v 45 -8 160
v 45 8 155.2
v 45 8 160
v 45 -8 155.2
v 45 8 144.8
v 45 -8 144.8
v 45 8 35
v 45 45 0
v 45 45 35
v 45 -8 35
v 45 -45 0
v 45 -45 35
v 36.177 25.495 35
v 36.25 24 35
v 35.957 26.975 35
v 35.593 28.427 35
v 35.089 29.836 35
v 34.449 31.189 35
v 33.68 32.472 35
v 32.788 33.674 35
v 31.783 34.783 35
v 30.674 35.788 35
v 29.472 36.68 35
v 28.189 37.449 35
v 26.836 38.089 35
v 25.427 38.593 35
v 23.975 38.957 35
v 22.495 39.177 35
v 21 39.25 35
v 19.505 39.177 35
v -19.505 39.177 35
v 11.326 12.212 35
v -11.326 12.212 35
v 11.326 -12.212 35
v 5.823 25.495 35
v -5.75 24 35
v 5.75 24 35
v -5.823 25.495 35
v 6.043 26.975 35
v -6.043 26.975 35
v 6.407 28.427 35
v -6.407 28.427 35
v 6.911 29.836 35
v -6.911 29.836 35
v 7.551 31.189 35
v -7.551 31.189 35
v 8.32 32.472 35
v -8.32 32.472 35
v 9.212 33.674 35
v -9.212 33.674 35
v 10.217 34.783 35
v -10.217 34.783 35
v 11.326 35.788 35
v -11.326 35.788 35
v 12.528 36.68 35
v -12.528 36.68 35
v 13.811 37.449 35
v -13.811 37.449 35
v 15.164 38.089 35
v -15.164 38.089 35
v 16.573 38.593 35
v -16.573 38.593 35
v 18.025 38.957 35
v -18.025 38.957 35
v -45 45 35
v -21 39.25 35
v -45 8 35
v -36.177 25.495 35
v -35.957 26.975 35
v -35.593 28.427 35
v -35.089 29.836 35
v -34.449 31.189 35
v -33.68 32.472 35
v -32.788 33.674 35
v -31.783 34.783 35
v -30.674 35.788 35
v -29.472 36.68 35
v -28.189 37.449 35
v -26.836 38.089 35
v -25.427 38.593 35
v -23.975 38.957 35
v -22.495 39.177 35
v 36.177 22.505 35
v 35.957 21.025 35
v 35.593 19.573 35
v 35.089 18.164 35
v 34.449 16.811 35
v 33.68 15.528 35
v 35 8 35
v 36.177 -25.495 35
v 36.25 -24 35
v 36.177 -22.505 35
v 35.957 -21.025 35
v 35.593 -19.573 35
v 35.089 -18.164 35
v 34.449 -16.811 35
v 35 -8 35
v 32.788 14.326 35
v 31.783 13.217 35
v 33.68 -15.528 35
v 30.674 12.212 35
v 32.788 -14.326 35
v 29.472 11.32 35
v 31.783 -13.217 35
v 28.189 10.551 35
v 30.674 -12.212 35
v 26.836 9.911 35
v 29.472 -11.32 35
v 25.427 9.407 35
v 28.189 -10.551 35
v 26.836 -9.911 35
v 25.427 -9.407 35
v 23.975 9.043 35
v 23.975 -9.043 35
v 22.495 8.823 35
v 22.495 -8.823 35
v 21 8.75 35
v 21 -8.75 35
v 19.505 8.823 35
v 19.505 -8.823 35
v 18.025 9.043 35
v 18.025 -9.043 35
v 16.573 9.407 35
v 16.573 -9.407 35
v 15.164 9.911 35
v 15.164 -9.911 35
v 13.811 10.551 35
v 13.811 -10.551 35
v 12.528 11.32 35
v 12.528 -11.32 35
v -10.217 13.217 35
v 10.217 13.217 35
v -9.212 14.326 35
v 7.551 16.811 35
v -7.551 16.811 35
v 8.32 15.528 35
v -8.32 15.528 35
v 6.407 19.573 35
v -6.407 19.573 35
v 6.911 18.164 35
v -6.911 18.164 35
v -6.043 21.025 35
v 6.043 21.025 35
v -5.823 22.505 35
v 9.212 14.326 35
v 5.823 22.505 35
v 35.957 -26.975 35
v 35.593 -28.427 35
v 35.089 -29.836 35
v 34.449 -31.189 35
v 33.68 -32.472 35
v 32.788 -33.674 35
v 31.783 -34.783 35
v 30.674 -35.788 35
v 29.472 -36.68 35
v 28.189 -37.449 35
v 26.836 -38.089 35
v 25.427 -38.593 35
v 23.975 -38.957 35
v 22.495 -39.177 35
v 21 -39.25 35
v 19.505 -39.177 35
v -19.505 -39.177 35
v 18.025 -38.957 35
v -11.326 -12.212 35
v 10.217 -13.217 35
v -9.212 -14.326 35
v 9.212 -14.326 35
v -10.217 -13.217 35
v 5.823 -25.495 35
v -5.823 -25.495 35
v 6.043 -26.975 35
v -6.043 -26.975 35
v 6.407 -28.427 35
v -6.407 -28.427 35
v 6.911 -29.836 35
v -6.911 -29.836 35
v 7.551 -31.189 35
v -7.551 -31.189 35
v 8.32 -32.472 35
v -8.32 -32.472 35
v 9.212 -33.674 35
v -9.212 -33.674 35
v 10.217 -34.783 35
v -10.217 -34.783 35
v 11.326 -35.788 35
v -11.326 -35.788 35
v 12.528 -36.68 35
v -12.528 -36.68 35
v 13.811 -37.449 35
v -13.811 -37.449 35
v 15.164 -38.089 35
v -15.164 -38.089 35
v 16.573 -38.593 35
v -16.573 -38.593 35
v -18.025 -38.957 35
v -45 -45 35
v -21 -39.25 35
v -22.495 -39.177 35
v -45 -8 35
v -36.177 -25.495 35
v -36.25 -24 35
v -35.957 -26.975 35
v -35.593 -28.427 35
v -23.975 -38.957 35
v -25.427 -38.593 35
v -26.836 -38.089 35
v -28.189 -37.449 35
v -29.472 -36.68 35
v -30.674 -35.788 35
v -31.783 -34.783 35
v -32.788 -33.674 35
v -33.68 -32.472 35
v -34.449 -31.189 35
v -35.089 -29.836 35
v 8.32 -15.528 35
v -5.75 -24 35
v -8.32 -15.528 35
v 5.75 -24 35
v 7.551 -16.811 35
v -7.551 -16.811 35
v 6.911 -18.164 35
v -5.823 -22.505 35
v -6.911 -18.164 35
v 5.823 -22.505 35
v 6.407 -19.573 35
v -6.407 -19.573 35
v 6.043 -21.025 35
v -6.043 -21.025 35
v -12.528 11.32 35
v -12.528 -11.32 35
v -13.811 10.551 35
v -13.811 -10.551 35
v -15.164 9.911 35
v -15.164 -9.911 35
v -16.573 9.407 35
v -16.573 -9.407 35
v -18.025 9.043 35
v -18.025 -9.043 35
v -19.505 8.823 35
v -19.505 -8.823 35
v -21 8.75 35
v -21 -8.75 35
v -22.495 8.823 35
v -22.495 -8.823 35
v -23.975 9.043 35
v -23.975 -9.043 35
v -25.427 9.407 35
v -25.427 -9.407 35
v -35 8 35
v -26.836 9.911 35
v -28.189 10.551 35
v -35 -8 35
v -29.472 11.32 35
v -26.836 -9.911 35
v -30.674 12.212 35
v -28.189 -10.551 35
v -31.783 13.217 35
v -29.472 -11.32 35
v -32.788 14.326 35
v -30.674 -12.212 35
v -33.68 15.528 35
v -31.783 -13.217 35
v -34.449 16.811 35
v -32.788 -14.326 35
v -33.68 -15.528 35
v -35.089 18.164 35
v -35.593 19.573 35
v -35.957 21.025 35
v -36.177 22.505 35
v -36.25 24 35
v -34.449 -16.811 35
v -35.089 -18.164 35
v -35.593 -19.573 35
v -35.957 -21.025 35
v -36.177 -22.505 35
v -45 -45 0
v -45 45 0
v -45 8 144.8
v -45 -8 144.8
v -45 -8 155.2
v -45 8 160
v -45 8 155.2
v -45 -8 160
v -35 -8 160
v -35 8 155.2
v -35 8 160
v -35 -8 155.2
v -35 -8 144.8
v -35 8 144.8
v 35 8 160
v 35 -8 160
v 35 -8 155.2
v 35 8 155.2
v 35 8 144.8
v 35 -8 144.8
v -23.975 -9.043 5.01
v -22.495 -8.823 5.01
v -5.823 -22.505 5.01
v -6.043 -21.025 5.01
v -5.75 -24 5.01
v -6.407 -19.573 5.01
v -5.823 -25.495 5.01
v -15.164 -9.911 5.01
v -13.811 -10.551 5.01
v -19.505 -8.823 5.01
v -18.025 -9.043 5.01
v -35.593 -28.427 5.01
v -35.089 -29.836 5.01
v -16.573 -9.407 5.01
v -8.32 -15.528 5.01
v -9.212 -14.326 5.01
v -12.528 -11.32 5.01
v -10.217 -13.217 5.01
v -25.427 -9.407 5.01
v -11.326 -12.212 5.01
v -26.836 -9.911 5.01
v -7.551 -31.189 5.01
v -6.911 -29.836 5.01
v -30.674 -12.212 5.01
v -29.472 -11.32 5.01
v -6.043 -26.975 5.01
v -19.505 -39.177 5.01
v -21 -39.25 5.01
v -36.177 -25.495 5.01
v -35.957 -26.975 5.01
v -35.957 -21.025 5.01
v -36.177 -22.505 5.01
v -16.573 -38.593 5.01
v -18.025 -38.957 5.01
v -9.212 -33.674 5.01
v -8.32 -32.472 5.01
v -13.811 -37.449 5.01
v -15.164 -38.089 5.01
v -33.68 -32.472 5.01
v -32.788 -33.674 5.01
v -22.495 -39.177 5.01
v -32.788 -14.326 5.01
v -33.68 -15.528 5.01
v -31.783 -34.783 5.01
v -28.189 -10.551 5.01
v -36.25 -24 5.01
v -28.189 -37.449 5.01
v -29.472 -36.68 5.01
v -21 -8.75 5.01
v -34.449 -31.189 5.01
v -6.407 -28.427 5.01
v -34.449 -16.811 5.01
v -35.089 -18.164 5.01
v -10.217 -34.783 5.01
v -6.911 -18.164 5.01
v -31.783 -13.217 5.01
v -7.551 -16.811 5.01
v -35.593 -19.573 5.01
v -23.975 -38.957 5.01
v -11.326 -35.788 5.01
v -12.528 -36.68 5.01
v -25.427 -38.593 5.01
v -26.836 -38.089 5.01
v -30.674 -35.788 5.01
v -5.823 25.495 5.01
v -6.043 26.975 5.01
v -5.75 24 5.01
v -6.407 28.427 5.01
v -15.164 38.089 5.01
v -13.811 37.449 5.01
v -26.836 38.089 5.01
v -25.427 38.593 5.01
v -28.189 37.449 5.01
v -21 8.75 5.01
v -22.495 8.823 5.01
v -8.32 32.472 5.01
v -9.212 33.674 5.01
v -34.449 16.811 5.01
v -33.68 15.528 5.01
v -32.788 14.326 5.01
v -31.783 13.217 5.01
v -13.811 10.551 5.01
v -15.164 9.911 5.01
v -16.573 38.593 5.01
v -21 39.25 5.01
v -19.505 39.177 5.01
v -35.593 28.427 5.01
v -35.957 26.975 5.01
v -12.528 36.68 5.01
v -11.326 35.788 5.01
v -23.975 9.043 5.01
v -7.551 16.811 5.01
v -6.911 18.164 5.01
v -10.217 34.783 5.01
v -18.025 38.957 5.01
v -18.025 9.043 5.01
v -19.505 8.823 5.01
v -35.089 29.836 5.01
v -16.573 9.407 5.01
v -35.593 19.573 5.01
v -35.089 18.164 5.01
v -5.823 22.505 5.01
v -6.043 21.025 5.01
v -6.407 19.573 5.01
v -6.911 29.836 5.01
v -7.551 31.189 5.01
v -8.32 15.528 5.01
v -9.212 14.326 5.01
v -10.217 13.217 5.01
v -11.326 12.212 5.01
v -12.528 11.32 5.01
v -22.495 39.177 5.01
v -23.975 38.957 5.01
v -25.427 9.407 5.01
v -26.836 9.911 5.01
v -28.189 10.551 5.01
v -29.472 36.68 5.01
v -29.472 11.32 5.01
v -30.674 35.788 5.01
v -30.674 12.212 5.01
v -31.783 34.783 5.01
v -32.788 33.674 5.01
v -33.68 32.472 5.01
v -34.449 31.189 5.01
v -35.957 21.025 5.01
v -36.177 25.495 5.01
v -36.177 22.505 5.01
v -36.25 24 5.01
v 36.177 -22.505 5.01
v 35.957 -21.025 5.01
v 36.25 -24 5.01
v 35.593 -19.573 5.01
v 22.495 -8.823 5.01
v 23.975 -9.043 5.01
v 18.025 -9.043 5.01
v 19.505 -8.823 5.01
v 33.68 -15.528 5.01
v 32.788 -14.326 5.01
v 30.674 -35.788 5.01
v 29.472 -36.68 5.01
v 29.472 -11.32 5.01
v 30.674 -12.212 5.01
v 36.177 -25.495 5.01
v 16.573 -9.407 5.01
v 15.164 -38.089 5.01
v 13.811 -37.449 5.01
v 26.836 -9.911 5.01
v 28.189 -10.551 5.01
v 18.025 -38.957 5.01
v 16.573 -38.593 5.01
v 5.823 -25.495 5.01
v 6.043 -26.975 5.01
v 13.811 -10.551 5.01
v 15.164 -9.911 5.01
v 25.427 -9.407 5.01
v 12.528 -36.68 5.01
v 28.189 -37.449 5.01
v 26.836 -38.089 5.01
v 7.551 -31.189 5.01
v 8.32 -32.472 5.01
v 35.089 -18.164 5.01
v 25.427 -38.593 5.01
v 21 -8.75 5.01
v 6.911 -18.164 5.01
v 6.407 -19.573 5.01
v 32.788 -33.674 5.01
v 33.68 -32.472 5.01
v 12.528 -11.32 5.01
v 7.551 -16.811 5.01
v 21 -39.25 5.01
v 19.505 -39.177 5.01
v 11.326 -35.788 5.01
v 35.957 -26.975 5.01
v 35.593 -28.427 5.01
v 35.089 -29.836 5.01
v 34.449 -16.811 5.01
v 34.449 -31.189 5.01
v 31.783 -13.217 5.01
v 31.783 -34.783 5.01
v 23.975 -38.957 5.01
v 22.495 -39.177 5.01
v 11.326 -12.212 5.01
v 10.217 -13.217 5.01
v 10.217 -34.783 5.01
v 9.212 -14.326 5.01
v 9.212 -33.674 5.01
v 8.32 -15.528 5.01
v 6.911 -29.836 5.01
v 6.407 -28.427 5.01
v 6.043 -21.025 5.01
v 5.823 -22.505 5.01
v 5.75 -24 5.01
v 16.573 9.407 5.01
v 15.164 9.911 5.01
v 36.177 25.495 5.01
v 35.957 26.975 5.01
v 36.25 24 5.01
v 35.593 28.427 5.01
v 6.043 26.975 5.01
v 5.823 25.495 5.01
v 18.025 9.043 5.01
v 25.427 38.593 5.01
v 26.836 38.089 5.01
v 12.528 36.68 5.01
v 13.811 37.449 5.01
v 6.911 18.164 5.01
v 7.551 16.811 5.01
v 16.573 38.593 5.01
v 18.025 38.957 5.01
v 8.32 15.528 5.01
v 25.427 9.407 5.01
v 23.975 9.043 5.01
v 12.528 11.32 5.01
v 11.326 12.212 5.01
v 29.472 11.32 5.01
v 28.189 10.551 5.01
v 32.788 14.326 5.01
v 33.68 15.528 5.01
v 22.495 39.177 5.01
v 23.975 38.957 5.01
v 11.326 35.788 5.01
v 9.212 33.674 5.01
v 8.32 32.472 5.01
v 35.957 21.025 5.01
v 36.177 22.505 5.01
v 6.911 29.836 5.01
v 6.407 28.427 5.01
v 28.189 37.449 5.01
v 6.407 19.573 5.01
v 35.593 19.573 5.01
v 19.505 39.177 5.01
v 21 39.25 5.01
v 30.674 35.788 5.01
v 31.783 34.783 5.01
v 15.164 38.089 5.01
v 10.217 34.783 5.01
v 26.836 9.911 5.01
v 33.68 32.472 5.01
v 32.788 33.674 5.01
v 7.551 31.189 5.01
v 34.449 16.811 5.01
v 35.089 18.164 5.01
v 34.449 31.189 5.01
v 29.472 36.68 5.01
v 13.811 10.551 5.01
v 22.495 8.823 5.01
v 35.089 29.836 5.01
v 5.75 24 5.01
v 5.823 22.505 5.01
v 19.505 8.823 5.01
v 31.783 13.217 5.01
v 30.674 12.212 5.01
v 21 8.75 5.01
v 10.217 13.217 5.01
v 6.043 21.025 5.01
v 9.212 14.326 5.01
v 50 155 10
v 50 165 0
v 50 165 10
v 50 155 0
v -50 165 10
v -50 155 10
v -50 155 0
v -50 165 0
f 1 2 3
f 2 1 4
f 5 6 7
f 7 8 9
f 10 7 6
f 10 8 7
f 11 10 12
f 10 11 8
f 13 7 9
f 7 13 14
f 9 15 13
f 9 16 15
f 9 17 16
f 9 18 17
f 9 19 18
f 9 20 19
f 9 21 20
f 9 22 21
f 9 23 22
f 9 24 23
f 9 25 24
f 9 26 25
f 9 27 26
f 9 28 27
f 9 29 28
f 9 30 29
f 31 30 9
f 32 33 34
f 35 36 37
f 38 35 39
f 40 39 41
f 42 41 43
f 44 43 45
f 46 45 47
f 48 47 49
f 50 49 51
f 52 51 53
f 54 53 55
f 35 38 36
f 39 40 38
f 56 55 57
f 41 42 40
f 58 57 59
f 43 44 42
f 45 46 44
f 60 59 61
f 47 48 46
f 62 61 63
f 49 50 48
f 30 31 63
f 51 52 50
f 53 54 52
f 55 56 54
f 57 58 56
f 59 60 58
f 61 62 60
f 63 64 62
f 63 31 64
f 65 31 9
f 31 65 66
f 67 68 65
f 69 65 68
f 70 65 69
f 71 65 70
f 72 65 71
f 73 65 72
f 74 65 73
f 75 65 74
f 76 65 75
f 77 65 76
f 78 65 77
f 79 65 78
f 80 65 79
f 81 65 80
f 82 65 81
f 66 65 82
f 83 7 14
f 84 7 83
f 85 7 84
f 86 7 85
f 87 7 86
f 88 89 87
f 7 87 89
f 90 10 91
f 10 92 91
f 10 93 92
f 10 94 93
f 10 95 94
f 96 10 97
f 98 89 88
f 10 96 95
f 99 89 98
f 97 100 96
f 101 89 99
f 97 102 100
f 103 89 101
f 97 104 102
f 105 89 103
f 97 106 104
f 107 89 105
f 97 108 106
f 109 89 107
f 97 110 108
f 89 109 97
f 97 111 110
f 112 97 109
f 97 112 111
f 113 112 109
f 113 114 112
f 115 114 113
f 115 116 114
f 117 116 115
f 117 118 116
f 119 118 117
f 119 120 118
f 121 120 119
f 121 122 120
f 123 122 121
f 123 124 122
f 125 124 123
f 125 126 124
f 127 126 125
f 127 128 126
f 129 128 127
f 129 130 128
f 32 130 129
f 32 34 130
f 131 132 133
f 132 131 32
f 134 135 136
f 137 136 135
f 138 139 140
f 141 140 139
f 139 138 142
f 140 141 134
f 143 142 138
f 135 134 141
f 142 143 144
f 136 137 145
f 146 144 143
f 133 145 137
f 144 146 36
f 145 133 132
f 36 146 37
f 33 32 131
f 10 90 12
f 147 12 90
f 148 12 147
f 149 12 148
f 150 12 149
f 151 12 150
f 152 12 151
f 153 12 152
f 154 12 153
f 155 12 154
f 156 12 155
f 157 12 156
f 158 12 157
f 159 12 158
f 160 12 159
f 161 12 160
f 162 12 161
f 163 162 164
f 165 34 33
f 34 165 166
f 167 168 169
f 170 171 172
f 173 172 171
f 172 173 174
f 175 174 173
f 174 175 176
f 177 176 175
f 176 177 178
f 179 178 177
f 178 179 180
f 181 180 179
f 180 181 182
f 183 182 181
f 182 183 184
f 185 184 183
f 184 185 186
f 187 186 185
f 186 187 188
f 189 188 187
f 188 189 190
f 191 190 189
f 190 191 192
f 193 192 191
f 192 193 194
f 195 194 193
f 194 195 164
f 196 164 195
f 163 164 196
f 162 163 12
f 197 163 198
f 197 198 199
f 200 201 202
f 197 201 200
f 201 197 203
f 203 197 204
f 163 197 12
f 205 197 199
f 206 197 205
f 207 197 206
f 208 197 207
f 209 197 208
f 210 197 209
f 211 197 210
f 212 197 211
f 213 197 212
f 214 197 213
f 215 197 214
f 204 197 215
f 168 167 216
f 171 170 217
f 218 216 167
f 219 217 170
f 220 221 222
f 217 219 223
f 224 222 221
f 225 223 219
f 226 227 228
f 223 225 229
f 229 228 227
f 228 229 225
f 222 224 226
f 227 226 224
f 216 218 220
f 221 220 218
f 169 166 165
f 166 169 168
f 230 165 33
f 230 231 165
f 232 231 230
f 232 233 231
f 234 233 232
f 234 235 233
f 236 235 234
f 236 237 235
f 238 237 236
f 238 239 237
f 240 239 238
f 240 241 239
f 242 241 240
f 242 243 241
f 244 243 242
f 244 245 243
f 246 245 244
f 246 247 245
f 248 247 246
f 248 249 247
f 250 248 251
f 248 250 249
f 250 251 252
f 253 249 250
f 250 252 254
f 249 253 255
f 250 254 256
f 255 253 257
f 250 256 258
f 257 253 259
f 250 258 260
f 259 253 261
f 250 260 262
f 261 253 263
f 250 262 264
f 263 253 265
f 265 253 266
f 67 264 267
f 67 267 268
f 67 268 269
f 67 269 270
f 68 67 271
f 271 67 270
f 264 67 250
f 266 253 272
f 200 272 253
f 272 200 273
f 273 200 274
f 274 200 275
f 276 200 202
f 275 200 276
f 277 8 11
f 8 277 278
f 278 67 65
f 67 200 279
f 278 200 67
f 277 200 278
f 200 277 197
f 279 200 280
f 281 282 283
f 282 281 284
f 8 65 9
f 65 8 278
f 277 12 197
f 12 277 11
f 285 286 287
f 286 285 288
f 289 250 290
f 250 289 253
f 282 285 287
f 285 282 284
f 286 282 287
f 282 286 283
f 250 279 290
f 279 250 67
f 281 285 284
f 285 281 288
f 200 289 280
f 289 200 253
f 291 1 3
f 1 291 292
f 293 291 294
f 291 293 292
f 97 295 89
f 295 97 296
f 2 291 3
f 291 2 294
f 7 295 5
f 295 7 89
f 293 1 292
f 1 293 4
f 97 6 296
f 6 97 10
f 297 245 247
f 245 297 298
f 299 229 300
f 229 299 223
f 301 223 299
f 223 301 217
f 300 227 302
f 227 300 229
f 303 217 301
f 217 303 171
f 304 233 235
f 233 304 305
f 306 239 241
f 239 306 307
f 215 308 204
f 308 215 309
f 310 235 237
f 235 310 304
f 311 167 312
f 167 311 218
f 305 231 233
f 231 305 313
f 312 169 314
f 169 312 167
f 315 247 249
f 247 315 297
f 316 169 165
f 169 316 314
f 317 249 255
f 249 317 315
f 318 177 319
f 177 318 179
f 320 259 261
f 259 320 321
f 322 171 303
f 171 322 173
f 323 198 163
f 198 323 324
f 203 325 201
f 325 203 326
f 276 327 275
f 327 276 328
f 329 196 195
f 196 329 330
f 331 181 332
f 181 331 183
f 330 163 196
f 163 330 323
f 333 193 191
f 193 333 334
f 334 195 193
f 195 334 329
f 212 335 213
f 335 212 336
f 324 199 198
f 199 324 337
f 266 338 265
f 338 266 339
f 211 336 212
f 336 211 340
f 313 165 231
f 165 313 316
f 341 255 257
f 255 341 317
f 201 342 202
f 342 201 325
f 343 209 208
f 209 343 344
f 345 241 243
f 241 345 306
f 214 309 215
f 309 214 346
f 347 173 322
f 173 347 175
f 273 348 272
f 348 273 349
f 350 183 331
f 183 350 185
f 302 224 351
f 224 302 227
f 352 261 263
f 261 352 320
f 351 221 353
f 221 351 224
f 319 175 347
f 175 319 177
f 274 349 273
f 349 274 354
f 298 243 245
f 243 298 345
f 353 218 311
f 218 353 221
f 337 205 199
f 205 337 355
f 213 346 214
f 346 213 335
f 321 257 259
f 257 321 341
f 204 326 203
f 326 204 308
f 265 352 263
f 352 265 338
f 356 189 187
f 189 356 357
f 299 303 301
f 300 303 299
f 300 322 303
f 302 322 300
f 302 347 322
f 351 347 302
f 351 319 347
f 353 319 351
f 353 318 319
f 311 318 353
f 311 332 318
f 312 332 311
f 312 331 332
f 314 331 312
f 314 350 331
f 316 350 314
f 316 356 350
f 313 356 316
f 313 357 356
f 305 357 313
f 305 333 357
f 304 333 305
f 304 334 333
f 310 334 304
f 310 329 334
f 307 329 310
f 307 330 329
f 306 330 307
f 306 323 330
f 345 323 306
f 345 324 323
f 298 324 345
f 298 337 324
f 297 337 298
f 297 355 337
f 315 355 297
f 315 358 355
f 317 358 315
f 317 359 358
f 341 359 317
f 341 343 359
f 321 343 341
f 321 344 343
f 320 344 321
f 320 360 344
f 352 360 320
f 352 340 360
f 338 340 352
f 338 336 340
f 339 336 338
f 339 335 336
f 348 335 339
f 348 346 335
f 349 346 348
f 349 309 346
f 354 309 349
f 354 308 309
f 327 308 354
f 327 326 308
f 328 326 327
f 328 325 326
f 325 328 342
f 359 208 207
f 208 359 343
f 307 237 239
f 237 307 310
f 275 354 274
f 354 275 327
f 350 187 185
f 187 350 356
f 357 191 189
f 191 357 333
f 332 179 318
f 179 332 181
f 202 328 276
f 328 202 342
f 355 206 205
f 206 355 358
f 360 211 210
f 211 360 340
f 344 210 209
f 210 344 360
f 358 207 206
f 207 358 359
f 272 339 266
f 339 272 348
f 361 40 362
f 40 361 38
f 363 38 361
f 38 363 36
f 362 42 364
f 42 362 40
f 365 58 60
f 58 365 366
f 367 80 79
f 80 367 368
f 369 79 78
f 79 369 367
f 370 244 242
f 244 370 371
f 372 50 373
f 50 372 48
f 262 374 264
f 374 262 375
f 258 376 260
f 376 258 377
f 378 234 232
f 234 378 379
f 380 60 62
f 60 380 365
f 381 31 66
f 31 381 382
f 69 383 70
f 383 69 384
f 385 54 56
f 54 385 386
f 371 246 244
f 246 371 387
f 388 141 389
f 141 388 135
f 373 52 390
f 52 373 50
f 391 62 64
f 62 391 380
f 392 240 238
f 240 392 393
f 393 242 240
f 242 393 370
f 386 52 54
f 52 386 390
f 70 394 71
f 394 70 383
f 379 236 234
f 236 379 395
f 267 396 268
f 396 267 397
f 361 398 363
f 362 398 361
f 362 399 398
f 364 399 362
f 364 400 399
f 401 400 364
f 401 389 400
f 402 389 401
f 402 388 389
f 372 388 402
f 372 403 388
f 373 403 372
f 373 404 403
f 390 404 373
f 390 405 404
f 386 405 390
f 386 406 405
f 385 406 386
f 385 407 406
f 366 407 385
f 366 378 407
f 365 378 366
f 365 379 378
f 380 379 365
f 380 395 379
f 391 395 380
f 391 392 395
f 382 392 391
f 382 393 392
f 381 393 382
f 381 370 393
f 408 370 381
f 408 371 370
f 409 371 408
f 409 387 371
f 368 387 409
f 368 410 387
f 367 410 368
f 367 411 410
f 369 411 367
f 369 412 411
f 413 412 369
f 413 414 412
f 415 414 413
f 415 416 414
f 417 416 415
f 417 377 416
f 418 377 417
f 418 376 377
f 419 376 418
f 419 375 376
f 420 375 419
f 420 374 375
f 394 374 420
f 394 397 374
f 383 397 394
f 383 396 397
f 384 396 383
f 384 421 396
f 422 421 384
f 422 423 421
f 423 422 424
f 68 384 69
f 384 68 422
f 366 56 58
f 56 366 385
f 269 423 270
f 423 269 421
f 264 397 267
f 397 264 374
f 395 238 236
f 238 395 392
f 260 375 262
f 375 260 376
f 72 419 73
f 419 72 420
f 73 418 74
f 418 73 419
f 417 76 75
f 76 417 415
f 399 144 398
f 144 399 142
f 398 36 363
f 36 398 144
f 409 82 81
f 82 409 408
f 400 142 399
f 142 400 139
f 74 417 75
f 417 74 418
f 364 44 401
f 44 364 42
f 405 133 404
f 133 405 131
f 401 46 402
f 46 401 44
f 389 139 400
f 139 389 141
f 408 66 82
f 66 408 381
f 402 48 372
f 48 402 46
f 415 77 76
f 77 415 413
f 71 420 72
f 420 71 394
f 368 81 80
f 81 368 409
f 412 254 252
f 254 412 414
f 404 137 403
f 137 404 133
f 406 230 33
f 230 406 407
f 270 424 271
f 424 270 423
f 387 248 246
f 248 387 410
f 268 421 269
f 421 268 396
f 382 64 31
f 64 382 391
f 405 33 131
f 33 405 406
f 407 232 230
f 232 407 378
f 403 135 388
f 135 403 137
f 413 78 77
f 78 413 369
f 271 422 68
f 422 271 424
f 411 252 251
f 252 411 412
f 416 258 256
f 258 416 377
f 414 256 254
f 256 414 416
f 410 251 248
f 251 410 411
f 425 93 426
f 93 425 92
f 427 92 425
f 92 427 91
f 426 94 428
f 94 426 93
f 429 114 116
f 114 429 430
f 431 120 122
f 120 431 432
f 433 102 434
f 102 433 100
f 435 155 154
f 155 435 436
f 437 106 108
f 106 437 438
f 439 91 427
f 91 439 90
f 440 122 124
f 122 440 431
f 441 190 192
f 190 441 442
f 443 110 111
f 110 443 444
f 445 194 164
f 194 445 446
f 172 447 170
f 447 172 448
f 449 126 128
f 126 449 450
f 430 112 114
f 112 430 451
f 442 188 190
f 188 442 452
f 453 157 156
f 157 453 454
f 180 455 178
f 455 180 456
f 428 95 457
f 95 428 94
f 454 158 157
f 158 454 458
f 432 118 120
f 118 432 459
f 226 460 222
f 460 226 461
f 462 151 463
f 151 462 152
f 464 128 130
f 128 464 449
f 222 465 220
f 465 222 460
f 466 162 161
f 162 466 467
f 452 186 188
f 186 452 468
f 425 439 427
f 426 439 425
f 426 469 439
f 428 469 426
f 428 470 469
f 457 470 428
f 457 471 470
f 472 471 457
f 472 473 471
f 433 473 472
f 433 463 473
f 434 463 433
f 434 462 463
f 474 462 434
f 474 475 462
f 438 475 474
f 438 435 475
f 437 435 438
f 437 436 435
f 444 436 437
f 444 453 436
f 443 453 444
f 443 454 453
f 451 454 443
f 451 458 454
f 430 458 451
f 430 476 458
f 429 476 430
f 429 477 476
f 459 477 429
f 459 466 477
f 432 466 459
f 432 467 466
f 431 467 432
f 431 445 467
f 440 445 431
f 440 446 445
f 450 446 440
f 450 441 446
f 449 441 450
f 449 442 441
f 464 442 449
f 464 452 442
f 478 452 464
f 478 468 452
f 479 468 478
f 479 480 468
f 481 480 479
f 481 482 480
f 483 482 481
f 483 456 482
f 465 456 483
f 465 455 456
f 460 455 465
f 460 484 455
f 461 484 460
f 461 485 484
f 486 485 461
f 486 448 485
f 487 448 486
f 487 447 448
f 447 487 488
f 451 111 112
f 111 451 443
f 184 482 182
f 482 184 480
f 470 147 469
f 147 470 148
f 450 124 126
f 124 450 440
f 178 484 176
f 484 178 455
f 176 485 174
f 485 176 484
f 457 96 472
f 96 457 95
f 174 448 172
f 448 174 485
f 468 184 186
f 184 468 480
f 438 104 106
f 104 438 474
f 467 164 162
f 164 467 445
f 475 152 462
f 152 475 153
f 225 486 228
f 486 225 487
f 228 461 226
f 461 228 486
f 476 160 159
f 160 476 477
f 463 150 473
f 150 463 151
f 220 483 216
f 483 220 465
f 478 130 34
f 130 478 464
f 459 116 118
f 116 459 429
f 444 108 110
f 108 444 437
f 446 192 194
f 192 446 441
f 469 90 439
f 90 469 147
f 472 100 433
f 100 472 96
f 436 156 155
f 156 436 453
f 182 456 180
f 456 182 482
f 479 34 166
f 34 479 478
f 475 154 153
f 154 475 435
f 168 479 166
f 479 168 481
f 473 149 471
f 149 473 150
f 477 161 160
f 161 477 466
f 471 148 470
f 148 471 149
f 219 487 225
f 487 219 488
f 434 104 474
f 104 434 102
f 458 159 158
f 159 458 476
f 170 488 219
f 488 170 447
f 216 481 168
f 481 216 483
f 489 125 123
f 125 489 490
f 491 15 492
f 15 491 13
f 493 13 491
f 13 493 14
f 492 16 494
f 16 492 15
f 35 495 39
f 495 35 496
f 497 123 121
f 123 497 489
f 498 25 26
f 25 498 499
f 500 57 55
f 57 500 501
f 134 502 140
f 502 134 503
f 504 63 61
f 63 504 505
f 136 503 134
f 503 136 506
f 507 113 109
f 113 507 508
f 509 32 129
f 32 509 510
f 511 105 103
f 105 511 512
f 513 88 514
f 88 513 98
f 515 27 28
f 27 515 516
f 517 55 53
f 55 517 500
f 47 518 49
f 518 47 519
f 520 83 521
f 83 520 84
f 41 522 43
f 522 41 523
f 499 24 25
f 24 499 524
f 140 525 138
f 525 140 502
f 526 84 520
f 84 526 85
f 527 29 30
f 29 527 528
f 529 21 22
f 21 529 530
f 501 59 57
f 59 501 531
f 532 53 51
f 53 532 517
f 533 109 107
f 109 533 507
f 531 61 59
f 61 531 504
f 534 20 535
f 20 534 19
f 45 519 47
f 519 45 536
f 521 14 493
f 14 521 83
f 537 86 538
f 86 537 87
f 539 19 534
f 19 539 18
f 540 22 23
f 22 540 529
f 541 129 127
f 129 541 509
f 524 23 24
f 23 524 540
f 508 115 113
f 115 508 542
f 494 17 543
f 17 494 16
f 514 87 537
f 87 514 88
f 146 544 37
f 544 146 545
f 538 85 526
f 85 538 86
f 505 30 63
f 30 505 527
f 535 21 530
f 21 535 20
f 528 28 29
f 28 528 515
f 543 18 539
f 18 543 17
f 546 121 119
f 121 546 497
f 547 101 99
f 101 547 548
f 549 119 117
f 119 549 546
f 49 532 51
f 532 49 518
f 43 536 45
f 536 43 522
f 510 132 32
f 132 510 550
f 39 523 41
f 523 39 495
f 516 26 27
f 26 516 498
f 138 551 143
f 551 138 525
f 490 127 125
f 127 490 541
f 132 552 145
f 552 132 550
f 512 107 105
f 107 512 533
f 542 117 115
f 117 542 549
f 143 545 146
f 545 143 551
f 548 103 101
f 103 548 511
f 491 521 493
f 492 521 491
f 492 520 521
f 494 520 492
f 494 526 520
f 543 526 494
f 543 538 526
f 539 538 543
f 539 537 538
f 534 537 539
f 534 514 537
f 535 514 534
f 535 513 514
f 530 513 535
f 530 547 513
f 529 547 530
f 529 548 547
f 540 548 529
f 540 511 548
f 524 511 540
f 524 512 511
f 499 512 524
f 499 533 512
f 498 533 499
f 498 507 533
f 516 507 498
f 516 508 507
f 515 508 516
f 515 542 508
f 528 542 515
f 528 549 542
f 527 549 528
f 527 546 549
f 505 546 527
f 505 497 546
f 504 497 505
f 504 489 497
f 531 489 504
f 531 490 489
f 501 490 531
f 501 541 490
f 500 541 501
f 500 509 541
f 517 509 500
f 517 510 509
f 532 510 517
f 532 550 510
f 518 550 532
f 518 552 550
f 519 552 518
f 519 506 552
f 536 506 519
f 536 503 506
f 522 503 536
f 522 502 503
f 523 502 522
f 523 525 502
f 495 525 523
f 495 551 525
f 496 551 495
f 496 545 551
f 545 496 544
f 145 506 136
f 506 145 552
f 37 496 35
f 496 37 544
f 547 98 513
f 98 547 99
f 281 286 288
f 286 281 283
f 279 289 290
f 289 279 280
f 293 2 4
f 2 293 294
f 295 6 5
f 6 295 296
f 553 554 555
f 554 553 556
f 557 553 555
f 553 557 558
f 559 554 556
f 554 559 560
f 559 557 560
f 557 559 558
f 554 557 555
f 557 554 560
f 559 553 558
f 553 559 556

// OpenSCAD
// Part 1: Base block with tube seats and vertical posts
// Part 2: Handle bar to be slid through the posts

// --- DIMENSIONS PART 1 ---
base_x      = 90.0;    // Base length (X)
base_y      = 90.0;    // Base width (Y)
base_z      = 35.0;    // Base height (Z)

seat_d      = 30.5;    // Diameter of tube seat
seat_depth  = 30.0;    // Depth of tube seat
seat_floor  = 5.0;     // Remaining floor thickness (35 - 30)

post_x_thick = 10.0;   // Thickness of post along X
post_y_wide  = 16.0;   // Width of post along Y
post_z_top   = 160.0;  // Top surface of post at Z=160

hole_sq_d    = 10.4;   // Square hole dimension (X-axis through post)
hole_sq_z    = 150.0;  // Z-height of the square hole center

// --- DIMENSIONS PART 2 ---
handle_x     = 100.0;  // Length of handle (X)
handle_w     = 10.0;   // Width of handle (Y)
handle_h     = 10.0;   // Height of handle (Z)
handle_y_min  = 55.0;  // Y-position start (55 to 65)
handle_y_max  = 65.0;  // Y-position end

// --- CONSTANTS ---
$fn = 64;

// --- PART 1: BASE AND POSTS ---
module part_1() {
    difference() {
        union() {
            // The Base Block
            translate([-base_x/2, -base_y/2, 0])
                cube([base_x, base_y, base_z]);

            // Post 1 (at -X end)
            // Positioned flush with end face (-45) and centered on Y
            translate([-base_x/2, -post_y_wide/2, base_z])
                cube([post_x_thick, post_y_wide, post_z_top - base_z]);

            // Post 2 (at +X end)
            // Positioned flush with end face (+45) and centered on Y
            translate([base_x/2 - post_x_thick, -post_y_wide/2, base_z])
                cube([post_x_thick, post_y_wide, post_z_top - base_z]);
        }

        // Tube Seats (Blind holes)
        for (sx = [-21, 21], sy = [-24, 24]) {
            translate([sx, sy, base_z - seat_depth + 0.01])
                cylinder(h = seat_depth + 0.1, d = seat_d);
        }

        // Square holes through posts
        // We subtract two cubes, one for each post, specifically at the Z height.
        // The cube height is hole_sq_d, and we center it at hole_sq_z.
        
        // Hole in Post 1
        translate([-base_x/2 - 1, -post_y_wide/2 - 1, hole_sq_z - hole_sq_d/2])
            cube([post_x_thick + 2, post_y_wide + 2, hole_sq_d]);
            
        // Hole in Post 2
        translate([base_x/2 - post_x_thick - 1, -post_y_wide/2 - 1, hole_sq_z - hole_sq_d/2])
            cube([post_x_thick + 2, post_y_wide + 2, hole_sq_d]);
    }
}

// --- PART 2: HANDLE ---
module part_2() {
    translate([-handle_x/2, handle_y_min, 0])
        cube([handle_x, handle_w, handle_h]);
}

// --- RENDERING ---
// Render Part 1
part_1();

// Render Part 2 (Offset for visibility in preview)
translate([0, 100, 0]) part_2();
